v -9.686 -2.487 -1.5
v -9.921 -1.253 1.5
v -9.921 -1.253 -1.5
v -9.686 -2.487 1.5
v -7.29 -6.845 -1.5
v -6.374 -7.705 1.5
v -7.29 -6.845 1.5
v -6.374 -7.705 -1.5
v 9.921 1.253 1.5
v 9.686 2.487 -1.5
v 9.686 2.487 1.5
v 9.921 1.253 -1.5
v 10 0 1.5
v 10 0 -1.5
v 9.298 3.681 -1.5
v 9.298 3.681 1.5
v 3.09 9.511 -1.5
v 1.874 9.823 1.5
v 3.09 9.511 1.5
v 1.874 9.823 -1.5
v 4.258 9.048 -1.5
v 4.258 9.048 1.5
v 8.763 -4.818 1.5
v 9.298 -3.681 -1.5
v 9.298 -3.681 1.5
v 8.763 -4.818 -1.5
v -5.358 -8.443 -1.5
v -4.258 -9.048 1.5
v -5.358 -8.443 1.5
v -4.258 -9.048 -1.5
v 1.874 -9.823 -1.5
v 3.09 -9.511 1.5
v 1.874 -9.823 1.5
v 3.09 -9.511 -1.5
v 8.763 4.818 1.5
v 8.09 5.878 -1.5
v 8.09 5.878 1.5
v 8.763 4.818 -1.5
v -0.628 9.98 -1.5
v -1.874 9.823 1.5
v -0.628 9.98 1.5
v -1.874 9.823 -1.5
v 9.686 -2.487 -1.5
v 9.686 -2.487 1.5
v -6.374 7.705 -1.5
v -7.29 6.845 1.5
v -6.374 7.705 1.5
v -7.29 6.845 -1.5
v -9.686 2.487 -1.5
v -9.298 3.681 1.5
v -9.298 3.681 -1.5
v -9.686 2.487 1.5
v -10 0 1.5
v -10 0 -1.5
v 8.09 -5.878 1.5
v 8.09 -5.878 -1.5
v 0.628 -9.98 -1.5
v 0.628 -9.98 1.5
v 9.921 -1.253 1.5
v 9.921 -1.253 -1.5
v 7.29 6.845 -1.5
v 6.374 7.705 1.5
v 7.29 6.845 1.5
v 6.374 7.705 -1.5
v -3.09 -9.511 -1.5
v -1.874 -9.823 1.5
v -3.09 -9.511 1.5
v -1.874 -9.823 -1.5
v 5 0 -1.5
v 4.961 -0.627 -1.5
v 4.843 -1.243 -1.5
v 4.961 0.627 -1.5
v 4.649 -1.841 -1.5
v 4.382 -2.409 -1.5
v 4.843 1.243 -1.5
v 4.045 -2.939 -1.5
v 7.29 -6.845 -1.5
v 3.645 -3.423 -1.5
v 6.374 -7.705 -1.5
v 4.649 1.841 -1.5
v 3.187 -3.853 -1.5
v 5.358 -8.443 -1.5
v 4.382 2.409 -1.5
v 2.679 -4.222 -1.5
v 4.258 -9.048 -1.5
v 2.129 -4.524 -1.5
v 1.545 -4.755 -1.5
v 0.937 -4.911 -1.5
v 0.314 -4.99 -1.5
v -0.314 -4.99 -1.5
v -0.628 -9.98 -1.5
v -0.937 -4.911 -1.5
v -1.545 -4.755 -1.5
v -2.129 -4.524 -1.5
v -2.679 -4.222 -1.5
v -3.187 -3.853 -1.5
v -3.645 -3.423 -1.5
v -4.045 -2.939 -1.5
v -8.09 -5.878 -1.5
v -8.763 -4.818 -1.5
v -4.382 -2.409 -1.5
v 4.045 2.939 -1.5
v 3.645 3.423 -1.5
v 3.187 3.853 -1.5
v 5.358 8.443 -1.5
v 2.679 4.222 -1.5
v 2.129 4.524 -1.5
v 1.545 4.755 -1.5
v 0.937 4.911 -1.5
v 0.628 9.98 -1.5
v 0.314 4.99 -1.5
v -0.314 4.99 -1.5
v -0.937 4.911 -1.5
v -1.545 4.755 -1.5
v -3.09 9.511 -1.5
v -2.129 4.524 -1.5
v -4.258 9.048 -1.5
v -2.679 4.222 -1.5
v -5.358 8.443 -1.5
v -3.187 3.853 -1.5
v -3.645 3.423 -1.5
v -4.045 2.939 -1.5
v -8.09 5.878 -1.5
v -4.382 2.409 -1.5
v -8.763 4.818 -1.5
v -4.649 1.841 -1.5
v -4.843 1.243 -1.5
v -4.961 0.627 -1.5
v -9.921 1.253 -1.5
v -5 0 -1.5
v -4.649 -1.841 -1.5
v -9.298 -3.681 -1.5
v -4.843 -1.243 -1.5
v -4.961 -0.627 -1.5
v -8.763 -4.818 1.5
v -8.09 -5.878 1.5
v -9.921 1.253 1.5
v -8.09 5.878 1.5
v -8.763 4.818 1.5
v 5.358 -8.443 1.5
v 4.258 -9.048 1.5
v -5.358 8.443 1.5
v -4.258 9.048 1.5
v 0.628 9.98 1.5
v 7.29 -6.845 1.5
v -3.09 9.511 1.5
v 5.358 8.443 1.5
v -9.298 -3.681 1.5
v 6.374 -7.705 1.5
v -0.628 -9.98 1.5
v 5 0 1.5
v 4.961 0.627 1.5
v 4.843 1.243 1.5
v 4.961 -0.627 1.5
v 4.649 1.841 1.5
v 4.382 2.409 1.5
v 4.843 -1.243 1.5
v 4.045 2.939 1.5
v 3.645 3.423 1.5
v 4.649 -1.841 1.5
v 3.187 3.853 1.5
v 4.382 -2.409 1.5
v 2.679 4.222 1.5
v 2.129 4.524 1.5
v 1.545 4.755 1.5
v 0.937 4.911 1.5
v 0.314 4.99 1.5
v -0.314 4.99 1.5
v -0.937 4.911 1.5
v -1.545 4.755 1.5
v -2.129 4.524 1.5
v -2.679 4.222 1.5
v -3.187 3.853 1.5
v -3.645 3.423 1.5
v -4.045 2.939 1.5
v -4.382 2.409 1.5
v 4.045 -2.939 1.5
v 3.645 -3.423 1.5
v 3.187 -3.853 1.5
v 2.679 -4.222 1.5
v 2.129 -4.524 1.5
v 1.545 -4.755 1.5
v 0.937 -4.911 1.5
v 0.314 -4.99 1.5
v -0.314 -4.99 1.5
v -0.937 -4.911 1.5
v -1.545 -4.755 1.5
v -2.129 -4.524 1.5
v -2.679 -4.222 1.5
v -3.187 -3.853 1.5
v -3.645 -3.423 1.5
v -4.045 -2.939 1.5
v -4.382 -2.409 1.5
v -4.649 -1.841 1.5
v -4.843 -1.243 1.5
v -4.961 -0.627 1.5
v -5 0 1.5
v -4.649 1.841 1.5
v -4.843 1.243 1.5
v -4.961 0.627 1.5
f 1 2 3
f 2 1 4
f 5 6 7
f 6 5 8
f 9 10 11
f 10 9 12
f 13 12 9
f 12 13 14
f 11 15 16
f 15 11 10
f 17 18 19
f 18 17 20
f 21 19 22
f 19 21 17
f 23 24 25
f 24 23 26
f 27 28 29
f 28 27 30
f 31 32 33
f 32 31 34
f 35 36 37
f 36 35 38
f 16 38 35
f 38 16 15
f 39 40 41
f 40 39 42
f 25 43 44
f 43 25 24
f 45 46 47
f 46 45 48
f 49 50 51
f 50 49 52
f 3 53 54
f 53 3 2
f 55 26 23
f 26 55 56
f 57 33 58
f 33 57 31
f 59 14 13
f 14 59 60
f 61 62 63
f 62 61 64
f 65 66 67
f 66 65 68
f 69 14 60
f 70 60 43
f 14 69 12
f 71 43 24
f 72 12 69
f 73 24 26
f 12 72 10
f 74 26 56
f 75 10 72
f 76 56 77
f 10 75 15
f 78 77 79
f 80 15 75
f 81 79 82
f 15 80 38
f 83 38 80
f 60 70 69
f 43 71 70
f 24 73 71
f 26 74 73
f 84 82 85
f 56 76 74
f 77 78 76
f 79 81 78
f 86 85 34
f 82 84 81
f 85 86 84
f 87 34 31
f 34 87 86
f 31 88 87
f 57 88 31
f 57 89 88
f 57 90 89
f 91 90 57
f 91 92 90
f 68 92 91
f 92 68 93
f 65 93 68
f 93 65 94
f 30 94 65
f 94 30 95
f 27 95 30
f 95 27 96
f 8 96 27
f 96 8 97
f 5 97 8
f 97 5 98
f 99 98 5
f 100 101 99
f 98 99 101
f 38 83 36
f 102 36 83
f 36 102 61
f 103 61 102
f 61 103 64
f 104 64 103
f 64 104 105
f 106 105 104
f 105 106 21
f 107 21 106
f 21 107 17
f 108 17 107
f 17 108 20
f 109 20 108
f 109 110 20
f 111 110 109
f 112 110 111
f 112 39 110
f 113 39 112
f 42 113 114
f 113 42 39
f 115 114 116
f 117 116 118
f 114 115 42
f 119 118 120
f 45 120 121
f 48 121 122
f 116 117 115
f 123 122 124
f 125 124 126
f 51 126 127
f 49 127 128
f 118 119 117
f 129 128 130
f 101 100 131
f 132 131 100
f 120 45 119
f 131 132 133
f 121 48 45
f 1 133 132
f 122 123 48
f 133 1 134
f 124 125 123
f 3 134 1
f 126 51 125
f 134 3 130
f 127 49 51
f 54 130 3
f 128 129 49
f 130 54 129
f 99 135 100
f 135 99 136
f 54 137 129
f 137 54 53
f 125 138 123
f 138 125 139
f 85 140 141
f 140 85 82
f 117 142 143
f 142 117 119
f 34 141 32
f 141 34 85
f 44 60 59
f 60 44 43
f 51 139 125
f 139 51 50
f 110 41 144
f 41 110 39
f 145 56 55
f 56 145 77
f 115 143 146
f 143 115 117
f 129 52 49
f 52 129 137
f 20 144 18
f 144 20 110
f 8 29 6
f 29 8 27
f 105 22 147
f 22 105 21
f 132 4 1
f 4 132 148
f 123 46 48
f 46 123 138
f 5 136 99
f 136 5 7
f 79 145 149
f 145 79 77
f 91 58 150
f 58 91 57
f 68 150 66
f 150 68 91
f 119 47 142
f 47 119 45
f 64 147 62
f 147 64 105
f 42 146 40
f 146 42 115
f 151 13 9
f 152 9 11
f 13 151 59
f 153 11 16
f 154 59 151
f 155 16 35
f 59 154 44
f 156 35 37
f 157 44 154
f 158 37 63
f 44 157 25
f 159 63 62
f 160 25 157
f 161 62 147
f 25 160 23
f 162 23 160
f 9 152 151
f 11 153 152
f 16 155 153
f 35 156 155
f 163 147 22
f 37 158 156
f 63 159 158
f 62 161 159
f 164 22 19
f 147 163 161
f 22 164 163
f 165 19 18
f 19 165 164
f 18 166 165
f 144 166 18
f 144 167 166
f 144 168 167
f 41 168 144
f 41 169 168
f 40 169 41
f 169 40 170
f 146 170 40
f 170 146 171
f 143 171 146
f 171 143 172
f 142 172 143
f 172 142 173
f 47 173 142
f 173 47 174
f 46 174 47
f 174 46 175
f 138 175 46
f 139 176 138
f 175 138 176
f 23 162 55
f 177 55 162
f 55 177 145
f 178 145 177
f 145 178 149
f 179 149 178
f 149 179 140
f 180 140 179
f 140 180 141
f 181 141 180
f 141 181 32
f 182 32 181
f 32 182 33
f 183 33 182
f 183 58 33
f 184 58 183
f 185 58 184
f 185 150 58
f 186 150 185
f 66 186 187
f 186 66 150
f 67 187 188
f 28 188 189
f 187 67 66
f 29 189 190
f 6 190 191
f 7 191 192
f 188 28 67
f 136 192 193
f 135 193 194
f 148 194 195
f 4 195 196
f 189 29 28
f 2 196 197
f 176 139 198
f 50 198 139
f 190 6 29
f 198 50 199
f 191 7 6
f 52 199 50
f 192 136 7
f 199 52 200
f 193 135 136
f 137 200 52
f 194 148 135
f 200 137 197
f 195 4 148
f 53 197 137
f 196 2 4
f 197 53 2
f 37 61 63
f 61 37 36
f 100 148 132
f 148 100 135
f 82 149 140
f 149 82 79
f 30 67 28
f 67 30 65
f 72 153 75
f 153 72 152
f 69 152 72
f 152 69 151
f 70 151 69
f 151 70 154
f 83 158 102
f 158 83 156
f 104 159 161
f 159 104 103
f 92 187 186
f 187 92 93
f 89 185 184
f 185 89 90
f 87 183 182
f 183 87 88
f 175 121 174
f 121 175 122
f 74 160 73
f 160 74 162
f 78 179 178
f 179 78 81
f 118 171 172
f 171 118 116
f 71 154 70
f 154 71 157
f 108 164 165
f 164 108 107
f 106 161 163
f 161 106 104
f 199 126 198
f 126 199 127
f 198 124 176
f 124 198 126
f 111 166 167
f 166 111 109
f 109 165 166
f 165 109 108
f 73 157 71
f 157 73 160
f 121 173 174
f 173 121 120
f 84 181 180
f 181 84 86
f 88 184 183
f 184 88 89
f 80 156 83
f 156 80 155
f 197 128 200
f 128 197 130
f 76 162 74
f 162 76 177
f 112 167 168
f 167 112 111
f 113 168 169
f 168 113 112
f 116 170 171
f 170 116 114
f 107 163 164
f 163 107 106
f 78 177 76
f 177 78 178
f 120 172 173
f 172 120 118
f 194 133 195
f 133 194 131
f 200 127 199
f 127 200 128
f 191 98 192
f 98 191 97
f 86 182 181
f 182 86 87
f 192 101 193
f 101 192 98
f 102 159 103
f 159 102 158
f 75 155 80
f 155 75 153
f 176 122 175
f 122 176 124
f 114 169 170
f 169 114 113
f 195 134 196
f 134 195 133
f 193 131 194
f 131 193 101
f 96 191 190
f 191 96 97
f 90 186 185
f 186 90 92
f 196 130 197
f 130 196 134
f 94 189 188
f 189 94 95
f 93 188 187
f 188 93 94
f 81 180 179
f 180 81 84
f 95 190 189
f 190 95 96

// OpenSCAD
$fn = 50;


difference() {
	union() {
		translate(v = [0, 0, -1.5000000000]) {
			cylinder(h = 3, r = 10.0000000000);
		}
	}
	union() {
		translate(v = [0, 0, -100.0000000000]) {
			cylinder(h = 200, r = 5.0000000000);
		}
	}
}
